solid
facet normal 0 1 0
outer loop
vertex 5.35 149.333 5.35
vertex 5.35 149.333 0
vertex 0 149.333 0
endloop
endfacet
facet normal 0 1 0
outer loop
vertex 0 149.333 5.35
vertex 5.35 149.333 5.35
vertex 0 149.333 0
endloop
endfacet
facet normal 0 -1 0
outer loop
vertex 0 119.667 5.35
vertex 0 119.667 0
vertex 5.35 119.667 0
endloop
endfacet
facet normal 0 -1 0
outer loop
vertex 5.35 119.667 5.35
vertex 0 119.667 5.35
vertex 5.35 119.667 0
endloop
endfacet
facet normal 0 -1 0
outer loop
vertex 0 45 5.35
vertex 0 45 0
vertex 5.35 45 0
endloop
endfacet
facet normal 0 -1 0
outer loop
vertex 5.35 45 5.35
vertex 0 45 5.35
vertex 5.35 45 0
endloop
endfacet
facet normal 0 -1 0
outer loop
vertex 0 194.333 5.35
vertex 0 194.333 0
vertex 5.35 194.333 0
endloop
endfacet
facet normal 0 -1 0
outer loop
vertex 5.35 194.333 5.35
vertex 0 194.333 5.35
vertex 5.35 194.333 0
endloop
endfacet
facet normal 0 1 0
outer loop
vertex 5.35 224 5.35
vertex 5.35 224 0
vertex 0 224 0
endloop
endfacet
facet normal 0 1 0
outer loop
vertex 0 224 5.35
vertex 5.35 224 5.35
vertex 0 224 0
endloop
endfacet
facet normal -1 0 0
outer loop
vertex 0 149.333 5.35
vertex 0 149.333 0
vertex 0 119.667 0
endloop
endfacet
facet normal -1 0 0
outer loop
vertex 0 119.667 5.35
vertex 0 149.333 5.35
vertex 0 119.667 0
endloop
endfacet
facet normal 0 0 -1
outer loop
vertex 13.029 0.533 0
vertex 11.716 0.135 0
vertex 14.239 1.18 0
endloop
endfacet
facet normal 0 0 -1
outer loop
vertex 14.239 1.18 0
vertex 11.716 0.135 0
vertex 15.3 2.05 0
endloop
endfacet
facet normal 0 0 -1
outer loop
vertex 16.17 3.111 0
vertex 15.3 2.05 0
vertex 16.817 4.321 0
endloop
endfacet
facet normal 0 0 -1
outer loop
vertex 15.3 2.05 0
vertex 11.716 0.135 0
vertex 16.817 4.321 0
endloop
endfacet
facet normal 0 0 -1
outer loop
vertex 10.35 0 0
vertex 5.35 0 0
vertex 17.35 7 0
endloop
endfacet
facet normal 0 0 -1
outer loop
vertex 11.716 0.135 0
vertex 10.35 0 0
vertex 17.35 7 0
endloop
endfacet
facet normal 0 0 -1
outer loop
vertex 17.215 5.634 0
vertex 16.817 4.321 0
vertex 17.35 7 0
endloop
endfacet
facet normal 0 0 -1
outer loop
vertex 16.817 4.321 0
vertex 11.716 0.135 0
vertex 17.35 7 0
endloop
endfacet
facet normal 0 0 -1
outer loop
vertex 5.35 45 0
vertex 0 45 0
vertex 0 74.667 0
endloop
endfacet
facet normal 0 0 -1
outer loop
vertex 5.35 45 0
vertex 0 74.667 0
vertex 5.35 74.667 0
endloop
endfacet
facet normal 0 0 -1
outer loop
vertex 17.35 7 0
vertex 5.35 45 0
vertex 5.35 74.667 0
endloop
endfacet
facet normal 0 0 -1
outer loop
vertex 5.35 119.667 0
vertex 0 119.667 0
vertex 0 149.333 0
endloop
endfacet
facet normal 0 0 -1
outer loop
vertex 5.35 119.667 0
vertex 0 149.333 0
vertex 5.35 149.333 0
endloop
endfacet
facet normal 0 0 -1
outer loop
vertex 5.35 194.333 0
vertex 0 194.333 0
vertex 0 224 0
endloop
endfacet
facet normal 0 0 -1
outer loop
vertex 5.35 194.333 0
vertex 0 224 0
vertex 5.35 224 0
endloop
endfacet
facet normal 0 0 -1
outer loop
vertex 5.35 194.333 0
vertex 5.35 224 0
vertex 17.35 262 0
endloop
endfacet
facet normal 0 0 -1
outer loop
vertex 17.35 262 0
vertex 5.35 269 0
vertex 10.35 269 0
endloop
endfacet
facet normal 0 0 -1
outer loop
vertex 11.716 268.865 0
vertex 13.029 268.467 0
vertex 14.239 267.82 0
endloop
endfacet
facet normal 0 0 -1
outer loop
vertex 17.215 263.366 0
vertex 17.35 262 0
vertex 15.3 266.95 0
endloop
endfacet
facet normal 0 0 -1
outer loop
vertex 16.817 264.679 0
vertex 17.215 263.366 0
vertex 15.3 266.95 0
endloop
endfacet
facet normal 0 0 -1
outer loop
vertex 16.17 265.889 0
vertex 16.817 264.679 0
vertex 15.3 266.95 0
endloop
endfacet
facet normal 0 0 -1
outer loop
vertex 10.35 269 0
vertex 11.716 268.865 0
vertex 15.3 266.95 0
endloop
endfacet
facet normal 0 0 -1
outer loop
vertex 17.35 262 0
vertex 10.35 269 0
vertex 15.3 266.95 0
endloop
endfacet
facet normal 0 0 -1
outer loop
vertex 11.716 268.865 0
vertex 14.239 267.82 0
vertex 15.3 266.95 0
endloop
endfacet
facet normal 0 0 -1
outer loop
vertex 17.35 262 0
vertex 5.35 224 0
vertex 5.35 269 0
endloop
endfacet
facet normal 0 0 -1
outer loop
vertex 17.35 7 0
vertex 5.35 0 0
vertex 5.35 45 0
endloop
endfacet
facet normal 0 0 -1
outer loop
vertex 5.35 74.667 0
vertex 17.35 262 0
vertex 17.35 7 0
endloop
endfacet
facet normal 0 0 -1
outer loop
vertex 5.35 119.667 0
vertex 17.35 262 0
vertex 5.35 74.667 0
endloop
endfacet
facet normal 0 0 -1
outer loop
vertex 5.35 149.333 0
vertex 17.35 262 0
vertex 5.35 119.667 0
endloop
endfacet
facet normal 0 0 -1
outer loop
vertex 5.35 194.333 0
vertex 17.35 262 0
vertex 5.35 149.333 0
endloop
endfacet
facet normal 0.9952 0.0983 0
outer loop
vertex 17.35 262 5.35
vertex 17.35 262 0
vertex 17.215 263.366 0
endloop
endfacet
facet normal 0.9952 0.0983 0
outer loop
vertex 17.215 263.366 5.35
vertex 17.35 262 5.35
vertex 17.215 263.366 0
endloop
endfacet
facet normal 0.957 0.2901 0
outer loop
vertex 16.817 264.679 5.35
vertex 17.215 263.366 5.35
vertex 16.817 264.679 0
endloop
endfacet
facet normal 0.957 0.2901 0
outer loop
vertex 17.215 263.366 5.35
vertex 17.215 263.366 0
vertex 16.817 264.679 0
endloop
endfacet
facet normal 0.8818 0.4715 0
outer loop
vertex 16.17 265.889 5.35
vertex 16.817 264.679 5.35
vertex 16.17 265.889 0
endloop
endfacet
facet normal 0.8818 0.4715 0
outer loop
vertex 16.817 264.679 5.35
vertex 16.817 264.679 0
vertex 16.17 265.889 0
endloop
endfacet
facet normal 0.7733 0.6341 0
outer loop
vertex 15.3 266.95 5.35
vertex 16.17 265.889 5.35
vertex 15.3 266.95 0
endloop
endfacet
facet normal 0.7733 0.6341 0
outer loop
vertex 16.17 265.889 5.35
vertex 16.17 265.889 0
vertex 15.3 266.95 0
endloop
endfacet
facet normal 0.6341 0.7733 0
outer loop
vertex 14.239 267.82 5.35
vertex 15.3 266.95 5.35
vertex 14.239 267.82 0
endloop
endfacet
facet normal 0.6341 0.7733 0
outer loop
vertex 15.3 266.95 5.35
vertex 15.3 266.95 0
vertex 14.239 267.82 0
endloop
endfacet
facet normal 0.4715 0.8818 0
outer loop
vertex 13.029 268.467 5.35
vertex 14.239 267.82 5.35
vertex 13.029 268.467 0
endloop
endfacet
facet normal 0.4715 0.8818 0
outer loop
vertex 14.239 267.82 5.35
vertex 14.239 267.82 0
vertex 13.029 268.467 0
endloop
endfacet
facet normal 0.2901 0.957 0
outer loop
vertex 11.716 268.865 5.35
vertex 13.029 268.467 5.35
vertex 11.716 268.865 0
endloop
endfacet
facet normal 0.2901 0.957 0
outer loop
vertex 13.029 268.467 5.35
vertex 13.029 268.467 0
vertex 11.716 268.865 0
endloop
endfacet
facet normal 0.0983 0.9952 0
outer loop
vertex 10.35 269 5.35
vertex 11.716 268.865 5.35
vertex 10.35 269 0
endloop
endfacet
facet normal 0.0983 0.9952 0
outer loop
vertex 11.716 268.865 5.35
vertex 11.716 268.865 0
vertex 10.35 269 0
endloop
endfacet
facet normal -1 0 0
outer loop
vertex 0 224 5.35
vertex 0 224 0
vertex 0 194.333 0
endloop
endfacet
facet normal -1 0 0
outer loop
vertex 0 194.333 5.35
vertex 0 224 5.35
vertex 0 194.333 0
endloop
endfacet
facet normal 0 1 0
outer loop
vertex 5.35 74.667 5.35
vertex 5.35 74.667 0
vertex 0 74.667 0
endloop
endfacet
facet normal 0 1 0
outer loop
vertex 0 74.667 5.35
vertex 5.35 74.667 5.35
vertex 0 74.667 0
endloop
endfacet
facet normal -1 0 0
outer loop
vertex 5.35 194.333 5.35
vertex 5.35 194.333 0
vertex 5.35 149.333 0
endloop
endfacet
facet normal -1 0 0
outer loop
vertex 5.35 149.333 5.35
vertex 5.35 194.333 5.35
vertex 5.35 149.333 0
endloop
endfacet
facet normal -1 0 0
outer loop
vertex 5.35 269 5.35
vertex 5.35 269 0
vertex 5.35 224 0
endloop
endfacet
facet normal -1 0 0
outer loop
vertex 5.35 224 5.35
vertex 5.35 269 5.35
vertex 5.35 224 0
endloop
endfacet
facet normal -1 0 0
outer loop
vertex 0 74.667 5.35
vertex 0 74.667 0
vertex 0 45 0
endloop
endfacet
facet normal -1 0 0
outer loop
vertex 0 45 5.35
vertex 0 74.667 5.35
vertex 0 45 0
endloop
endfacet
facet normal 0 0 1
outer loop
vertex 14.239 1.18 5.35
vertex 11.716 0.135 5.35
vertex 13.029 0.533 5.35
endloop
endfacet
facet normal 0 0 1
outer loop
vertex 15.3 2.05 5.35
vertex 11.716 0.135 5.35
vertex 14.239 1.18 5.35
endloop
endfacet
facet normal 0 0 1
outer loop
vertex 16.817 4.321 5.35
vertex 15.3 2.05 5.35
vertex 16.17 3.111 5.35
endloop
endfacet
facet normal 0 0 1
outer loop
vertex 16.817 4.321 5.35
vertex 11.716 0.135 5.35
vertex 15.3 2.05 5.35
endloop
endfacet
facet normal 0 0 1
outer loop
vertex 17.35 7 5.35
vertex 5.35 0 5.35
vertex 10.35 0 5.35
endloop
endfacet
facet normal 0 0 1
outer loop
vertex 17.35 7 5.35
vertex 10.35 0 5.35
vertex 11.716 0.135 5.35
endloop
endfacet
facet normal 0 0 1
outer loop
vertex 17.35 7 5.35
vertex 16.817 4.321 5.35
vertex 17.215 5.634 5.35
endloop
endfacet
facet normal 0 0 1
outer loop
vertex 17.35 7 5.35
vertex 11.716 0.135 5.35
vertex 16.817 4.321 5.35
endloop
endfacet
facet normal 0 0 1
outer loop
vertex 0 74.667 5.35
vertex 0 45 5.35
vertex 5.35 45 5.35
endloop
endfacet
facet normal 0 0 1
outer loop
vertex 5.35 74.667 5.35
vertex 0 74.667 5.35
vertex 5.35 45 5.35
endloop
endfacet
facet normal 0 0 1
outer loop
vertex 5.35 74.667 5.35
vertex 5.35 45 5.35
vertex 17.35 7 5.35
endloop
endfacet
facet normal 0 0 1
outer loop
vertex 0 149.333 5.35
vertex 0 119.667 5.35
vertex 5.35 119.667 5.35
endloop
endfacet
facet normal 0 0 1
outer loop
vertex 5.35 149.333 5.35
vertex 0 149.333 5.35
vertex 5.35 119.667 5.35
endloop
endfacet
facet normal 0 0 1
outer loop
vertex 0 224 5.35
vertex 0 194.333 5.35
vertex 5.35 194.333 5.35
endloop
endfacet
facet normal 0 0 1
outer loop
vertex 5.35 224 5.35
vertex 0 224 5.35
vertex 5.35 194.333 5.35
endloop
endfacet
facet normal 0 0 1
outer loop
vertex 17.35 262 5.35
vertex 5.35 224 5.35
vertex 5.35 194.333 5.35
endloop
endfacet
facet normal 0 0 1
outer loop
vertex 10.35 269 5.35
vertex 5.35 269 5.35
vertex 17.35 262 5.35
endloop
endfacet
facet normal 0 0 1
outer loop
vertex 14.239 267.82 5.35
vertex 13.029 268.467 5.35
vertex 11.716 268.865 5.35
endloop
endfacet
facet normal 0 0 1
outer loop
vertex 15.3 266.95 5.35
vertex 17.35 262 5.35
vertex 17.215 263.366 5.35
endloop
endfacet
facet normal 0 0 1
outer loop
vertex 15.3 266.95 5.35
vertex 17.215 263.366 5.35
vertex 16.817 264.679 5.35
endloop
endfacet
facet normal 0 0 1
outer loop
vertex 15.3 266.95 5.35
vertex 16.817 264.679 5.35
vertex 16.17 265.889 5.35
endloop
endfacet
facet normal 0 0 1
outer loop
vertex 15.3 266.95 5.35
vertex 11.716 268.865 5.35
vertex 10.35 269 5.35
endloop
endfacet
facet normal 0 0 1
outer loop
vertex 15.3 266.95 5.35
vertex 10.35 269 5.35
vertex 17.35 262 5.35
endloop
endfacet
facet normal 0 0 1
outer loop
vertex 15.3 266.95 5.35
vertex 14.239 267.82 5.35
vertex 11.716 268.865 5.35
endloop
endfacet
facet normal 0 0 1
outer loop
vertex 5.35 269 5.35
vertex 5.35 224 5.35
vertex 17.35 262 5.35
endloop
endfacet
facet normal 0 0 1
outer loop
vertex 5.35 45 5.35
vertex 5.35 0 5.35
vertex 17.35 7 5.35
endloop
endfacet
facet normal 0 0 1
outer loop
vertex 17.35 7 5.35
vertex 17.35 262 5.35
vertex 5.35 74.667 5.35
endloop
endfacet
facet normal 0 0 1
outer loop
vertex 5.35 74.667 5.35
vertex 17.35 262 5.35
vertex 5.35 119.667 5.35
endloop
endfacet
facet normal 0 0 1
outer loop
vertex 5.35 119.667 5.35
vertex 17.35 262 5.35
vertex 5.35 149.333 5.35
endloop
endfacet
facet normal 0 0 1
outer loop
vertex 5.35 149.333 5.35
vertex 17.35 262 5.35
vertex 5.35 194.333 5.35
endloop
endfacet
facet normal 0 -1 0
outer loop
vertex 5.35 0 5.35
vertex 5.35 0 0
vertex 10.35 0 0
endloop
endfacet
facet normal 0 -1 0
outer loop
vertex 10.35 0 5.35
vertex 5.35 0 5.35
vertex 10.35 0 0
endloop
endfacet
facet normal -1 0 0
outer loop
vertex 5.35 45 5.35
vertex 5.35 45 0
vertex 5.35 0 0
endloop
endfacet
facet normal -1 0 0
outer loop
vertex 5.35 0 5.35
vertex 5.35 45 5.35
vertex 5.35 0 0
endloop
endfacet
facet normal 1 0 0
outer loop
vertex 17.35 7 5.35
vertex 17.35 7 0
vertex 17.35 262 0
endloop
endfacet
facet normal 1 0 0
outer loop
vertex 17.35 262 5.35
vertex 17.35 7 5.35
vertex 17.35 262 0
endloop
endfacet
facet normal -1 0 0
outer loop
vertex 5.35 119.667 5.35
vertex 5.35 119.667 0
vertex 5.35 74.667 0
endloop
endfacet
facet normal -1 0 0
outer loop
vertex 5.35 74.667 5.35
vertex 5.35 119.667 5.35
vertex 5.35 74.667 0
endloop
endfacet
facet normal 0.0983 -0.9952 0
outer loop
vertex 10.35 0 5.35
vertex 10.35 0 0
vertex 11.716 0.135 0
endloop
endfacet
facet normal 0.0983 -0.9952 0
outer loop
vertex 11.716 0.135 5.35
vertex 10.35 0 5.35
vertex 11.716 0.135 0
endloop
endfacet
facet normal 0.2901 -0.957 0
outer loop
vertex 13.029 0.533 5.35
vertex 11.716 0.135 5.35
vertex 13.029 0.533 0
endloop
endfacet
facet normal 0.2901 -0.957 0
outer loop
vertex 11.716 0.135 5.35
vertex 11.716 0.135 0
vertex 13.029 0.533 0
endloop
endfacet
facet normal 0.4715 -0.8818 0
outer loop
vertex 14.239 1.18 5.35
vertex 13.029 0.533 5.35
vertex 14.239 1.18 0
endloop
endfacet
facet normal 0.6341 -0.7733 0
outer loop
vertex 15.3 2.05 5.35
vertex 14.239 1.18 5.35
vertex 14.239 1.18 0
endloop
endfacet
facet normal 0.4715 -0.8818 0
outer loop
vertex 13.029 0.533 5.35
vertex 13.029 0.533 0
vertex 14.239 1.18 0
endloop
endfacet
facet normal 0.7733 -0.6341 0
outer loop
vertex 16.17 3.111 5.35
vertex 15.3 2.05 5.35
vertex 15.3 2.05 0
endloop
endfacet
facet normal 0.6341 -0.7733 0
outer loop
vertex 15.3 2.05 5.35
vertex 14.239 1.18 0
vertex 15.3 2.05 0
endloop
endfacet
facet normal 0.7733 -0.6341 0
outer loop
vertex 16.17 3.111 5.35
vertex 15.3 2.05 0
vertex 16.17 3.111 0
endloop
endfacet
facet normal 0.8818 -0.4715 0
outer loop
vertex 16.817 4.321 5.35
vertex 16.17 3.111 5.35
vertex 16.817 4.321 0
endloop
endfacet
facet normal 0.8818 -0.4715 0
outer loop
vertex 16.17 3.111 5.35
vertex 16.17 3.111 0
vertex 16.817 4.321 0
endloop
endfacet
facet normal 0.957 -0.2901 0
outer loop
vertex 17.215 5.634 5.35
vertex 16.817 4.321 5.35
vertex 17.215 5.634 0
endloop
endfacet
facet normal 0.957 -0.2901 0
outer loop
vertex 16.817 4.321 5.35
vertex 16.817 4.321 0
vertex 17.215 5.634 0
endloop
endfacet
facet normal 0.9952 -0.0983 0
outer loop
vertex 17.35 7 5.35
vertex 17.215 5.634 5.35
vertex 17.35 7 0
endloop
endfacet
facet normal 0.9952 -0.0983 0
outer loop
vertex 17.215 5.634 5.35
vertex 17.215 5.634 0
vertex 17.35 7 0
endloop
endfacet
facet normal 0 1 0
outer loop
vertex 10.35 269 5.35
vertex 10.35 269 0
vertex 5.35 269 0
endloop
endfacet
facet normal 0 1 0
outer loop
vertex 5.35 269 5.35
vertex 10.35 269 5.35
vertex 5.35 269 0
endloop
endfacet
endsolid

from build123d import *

# Parameters (mm, degrees)
BOSS_EXTRUDE1_DEPTH = 5.35


with BuildPart() as part:
    # Model → Boss-Extrude1 (new body)
    with BuildSketch(Plane.XY):
        with BuildLine():
            Line((10.350000329, 268.999993801), (5.350000225, 268.999993801))
            Line((5.350000225, 268.999993801), (5.350000225, 223.999992013))
            Line((5.350000225, 223.999992013), (0, 223.999992013))
            Line((0, 223.999992013), (0, 194.333329797))
            Line((0, 194.333329797), (5.350000225, 194.333329797))
            Line((5.350000225, 194.333329797), (5.350000225, 149.333328009))
            Line((5.350000225, 149.333328009), (0, 149.333328009))
            Line((0, 149.333328009), (0, 119.666665792))
            Line((0, 119.666665792), (5.350000225, 119.666665792))
            Line((5.350000225, 119.666665792), (5.350000225, 74.666664004))
            Line((5.350000225, 74.666664004), (0, 74.666664004))
            Line((0, 74.666664004), (0, 44.999986887))
            Line((0, 44.999986887), (5.350000225, 44.999986887))
            Line((5.350000225, 44.999986887), (5.350000225, 0))
            Line((5.350000225, 0), (10.350000113, 0))
            ThreePointArc((10.350000113, 0), (15.299747721, 2.050252455), (17.350000329, 7))
            Line((17.350000329, 7), (17.350000329, 261.999993585))
            ThreePointArc((17.350000329, 261.999993585), (15.299747874, 266.949741193), (10.350000329, 268.999993801))
        make_face()
    extrude(amount=BOSS_EXTRUDE1_DEPTH)


solid = part.part
